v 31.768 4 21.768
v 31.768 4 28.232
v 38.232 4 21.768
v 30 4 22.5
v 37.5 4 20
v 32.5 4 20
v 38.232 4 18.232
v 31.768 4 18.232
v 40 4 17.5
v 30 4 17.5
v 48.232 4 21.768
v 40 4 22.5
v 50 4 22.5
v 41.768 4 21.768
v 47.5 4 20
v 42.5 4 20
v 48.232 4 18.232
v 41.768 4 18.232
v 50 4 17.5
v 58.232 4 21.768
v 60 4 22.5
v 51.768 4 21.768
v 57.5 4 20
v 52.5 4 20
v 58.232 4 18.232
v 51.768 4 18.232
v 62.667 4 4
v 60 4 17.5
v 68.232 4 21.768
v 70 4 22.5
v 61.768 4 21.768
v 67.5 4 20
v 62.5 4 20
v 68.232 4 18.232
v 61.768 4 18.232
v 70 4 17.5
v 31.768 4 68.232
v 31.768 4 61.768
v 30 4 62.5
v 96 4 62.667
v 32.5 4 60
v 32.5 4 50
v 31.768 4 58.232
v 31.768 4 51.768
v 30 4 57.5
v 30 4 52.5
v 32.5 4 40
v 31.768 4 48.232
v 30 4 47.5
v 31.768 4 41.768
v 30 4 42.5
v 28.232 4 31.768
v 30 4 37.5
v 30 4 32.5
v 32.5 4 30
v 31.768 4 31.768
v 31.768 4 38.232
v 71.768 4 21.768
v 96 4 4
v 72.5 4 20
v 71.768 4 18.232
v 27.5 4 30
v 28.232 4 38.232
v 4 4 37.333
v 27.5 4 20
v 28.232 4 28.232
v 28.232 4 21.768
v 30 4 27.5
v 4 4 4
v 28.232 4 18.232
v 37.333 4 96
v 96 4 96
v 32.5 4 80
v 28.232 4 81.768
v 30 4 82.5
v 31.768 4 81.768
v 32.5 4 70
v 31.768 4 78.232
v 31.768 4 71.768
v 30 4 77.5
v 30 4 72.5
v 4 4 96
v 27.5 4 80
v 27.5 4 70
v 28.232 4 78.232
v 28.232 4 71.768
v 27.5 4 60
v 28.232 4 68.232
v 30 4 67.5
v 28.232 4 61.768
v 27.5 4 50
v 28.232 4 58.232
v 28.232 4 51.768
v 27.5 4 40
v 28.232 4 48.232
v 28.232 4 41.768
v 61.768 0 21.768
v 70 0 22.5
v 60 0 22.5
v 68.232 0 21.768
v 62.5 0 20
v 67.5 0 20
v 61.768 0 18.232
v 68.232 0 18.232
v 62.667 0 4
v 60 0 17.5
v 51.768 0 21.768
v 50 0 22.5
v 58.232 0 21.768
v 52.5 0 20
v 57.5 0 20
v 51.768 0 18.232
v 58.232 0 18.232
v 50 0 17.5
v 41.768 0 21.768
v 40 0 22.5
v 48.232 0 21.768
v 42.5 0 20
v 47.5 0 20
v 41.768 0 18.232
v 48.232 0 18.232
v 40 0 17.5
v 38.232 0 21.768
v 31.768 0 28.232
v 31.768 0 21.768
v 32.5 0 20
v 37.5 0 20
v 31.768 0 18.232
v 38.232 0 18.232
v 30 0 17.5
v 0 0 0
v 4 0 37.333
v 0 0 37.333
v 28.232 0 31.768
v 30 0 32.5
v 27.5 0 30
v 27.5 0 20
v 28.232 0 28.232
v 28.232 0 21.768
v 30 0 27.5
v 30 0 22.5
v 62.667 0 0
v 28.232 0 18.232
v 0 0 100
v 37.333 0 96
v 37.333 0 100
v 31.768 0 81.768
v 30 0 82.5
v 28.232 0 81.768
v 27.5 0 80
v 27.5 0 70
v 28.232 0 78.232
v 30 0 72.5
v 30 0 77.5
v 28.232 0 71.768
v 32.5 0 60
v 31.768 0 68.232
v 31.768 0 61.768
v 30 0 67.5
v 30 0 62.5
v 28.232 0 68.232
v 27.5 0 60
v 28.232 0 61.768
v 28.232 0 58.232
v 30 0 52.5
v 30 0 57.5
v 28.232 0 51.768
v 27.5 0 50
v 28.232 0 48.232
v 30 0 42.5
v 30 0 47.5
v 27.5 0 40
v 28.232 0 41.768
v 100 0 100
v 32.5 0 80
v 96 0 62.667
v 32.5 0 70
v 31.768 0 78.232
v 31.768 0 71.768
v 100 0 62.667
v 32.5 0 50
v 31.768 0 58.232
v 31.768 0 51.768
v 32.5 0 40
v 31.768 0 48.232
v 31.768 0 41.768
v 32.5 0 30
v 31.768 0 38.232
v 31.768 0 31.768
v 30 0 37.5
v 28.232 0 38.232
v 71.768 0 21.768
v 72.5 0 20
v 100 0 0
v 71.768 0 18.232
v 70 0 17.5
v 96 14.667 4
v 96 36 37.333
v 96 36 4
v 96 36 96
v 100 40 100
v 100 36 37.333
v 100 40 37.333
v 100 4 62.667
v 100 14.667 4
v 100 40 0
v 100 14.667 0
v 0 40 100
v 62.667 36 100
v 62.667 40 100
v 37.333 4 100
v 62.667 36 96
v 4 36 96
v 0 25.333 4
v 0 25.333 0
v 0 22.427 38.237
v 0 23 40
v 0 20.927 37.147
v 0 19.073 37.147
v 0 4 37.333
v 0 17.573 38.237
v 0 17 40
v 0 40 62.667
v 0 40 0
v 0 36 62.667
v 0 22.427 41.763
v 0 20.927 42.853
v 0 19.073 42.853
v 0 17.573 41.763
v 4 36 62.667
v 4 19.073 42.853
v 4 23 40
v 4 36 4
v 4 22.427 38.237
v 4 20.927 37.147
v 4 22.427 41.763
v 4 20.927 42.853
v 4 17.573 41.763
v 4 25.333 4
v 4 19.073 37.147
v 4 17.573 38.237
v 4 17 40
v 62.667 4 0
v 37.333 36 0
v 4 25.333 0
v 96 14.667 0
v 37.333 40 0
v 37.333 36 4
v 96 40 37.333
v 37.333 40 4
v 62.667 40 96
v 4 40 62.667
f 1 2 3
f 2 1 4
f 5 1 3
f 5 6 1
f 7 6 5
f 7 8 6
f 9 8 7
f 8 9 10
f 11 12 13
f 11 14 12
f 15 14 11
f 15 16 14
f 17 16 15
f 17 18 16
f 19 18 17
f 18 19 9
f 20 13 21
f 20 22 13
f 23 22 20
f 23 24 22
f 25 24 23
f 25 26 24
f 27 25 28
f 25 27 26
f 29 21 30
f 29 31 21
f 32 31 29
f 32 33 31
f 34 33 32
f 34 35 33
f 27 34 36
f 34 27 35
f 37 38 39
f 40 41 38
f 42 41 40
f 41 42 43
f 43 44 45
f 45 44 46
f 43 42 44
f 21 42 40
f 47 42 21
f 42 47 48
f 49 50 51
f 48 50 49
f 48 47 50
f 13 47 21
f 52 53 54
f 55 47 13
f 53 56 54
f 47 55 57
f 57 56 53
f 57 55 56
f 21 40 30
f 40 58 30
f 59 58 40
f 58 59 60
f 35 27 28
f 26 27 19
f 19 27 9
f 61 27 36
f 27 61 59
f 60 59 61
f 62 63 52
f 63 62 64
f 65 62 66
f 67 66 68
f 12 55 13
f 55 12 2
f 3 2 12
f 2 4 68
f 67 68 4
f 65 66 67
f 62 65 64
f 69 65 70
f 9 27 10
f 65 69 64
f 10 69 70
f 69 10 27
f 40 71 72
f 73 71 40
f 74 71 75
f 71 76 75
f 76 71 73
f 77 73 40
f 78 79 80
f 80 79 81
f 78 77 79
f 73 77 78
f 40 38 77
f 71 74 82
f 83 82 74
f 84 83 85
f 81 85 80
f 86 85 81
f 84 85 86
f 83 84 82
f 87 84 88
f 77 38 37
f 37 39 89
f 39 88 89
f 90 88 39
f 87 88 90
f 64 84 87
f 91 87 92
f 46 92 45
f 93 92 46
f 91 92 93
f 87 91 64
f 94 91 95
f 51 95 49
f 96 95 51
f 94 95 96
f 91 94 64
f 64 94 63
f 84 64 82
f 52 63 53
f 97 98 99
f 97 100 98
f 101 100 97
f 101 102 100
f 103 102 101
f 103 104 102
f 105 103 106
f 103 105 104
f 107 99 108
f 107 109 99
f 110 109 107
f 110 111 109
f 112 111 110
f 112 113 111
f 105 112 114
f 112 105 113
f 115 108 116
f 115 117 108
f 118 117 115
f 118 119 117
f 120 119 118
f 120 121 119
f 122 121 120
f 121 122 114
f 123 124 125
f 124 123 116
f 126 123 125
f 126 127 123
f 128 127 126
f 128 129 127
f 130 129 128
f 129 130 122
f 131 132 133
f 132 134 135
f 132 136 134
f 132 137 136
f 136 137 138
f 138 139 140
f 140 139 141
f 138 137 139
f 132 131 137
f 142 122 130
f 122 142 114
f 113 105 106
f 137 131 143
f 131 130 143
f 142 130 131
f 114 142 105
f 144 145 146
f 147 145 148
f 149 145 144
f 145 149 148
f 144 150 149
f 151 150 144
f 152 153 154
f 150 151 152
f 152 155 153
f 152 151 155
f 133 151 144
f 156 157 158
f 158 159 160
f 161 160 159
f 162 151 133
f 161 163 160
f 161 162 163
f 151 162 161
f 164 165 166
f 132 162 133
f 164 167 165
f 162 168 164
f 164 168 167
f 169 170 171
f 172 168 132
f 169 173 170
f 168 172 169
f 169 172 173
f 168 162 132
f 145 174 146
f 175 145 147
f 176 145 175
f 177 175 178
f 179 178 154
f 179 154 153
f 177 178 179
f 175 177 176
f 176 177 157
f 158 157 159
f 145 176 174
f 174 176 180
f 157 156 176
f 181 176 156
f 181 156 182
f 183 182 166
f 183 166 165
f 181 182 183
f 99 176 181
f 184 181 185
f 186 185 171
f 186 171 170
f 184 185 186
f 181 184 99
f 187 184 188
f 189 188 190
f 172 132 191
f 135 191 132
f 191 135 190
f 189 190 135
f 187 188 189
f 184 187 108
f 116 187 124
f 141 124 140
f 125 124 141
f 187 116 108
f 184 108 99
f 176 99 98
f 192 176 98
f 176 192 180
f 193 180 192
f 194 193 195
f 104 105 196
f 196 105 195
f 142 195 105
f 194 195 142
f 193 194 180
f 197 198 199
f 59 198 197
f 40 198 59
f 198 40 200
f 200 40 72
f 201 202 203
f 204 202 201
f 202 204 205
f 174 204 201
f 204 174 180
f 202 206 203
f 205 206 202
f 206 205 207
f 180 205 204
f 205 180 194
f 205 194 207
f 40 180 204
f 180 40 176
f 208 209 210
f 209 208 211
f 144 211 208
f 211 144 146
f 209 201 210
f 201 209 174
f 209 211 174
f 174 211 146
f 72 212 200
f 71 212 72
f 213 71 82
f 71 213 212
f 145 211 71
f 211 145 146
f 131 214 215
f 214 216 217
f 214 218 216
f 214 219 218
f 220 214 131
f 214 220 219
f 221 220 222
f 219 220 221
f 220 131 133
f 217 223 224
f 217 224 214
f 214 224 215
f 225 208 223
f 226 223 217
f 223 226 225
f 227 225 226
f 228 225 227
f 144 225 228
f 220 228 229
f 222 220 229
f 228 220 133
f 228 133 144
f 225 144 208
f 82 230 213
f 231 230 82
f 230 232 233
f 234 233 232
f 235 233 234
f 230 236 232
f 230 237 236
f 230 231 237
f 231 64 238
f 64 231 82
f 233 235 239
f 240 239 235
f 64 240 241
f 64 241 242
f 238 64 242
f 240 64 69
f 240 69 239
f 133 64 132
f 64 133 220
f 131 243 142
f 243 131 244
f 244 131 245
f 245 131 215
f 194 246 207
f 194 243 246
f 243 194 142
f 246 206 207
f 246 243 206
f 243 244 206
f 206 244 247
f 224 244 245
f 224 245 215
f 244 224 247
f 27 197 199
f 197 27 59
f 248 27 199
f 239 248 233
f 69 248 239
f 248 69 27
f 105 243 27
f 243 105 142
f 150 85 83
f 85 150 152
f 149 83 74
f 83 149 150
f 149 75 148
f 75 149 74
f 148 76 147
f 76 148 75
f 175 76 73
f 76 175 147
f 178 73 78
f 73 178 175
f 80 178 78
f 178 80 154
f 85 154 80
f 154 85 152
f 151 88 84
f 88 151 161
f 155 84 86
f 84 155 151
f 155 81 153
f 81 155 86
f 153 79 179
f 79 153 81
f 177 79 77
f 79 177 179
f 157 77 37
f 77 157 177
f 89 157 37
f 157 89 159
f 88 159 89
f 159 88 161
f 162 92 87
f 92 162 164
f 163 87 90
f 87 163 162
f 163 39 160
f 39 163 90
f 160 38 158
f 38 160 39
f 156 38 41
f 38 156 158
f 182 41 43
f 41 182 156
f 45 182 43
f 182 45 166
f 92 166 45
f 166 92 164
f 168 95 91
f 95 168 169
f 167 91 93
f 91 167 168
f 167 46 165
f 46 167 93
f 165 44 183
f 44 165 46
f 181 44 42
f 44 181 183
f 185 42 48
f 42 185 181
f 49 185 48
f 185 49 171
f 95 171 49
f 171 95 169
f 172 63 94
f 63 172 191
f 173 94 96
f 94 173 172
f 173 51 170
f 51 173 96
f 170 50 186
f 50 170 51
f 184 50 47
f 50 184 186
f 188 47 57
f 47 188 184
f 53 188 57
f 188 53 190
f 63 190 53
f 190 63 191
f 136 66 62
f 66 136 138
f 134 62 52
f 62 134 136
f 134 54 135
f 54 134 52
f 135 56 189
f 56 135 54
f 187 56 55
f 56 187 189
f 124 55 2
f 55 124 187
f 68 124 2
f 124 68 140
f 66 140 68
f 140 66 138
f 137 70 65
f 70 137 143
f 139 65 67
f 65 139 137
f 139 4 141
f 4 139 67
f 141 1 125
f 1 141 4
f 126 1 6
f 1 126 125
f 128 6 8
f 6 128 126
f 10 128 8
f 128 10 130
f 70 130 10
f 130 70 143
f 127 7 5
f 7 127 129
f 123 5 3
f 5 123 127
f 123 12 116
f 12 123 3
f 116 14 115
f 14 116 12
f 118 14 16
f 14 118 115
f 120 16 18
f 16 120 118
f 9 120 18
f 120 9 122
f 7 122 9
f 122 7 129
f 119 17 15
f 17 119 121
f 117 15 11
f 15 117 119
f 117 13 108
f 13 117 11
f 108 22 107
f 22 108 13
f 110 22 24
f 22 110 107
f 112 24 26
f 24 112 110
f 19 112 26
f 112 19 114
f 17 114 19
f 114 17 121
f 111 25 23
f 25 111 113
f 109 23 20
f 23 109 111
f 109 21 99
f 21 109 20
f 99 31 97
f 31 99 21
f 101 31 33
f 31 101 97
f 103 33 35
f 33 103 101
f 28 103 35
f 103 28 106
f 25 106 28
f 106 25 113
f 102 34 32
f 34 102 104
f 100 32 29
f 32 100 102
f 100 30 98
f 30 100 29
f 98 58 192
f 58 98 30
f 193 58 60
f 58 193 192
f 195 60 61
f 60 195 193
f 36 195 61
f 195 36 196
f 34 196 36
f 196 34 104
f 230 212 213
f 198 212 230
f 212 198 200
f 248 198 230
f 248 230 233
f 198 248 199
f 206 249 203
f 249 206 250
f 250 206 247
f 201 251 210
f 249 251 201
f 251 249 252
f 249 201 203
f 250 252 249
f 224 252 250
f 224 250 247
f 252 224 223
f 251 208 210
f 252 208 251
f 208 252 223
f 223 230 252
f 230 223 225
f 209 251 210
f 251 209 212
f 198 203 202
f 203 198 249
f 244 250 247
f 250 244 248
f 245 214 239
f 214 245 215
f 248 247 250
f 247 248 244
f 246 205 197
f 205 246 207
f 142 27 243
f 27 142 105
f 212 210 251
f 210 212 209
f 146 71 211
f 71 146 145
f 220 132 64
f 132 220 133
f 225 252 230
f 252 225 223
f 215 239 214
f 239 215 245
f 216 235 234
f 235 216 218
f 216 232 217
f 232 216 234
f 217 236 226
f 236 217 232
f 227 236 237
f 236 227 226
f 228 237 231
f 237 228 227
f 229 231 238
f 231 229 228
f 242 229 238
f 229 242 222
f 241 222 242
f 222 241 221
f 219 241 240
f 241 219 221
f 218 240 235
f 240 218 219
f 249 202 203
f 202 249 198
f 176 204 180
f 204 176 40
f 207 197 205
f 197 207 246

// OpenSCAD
include <./box.scad>
box(
    width = 100,
    height = 100,
    depth = 40,
    thickness = 4,
    finger_width = 20, // default is thickness * 2
    assemble = true,
    labels = true,
    open = false,
    holes_left = [
        [20,40]
    ],
    hole_left_dia = 6,
    spacing = 3,
    holes_front = [
        [30,80],
        [30,70],
        [30,60],
        [30,50],
        [30,40],
        [30,30],
        [30,20],
        [40,20],
        [50,20],
        [60,20],
        [70,20]
    ],
    hole_front_dia = 5,
    only_front_holes = true
);
